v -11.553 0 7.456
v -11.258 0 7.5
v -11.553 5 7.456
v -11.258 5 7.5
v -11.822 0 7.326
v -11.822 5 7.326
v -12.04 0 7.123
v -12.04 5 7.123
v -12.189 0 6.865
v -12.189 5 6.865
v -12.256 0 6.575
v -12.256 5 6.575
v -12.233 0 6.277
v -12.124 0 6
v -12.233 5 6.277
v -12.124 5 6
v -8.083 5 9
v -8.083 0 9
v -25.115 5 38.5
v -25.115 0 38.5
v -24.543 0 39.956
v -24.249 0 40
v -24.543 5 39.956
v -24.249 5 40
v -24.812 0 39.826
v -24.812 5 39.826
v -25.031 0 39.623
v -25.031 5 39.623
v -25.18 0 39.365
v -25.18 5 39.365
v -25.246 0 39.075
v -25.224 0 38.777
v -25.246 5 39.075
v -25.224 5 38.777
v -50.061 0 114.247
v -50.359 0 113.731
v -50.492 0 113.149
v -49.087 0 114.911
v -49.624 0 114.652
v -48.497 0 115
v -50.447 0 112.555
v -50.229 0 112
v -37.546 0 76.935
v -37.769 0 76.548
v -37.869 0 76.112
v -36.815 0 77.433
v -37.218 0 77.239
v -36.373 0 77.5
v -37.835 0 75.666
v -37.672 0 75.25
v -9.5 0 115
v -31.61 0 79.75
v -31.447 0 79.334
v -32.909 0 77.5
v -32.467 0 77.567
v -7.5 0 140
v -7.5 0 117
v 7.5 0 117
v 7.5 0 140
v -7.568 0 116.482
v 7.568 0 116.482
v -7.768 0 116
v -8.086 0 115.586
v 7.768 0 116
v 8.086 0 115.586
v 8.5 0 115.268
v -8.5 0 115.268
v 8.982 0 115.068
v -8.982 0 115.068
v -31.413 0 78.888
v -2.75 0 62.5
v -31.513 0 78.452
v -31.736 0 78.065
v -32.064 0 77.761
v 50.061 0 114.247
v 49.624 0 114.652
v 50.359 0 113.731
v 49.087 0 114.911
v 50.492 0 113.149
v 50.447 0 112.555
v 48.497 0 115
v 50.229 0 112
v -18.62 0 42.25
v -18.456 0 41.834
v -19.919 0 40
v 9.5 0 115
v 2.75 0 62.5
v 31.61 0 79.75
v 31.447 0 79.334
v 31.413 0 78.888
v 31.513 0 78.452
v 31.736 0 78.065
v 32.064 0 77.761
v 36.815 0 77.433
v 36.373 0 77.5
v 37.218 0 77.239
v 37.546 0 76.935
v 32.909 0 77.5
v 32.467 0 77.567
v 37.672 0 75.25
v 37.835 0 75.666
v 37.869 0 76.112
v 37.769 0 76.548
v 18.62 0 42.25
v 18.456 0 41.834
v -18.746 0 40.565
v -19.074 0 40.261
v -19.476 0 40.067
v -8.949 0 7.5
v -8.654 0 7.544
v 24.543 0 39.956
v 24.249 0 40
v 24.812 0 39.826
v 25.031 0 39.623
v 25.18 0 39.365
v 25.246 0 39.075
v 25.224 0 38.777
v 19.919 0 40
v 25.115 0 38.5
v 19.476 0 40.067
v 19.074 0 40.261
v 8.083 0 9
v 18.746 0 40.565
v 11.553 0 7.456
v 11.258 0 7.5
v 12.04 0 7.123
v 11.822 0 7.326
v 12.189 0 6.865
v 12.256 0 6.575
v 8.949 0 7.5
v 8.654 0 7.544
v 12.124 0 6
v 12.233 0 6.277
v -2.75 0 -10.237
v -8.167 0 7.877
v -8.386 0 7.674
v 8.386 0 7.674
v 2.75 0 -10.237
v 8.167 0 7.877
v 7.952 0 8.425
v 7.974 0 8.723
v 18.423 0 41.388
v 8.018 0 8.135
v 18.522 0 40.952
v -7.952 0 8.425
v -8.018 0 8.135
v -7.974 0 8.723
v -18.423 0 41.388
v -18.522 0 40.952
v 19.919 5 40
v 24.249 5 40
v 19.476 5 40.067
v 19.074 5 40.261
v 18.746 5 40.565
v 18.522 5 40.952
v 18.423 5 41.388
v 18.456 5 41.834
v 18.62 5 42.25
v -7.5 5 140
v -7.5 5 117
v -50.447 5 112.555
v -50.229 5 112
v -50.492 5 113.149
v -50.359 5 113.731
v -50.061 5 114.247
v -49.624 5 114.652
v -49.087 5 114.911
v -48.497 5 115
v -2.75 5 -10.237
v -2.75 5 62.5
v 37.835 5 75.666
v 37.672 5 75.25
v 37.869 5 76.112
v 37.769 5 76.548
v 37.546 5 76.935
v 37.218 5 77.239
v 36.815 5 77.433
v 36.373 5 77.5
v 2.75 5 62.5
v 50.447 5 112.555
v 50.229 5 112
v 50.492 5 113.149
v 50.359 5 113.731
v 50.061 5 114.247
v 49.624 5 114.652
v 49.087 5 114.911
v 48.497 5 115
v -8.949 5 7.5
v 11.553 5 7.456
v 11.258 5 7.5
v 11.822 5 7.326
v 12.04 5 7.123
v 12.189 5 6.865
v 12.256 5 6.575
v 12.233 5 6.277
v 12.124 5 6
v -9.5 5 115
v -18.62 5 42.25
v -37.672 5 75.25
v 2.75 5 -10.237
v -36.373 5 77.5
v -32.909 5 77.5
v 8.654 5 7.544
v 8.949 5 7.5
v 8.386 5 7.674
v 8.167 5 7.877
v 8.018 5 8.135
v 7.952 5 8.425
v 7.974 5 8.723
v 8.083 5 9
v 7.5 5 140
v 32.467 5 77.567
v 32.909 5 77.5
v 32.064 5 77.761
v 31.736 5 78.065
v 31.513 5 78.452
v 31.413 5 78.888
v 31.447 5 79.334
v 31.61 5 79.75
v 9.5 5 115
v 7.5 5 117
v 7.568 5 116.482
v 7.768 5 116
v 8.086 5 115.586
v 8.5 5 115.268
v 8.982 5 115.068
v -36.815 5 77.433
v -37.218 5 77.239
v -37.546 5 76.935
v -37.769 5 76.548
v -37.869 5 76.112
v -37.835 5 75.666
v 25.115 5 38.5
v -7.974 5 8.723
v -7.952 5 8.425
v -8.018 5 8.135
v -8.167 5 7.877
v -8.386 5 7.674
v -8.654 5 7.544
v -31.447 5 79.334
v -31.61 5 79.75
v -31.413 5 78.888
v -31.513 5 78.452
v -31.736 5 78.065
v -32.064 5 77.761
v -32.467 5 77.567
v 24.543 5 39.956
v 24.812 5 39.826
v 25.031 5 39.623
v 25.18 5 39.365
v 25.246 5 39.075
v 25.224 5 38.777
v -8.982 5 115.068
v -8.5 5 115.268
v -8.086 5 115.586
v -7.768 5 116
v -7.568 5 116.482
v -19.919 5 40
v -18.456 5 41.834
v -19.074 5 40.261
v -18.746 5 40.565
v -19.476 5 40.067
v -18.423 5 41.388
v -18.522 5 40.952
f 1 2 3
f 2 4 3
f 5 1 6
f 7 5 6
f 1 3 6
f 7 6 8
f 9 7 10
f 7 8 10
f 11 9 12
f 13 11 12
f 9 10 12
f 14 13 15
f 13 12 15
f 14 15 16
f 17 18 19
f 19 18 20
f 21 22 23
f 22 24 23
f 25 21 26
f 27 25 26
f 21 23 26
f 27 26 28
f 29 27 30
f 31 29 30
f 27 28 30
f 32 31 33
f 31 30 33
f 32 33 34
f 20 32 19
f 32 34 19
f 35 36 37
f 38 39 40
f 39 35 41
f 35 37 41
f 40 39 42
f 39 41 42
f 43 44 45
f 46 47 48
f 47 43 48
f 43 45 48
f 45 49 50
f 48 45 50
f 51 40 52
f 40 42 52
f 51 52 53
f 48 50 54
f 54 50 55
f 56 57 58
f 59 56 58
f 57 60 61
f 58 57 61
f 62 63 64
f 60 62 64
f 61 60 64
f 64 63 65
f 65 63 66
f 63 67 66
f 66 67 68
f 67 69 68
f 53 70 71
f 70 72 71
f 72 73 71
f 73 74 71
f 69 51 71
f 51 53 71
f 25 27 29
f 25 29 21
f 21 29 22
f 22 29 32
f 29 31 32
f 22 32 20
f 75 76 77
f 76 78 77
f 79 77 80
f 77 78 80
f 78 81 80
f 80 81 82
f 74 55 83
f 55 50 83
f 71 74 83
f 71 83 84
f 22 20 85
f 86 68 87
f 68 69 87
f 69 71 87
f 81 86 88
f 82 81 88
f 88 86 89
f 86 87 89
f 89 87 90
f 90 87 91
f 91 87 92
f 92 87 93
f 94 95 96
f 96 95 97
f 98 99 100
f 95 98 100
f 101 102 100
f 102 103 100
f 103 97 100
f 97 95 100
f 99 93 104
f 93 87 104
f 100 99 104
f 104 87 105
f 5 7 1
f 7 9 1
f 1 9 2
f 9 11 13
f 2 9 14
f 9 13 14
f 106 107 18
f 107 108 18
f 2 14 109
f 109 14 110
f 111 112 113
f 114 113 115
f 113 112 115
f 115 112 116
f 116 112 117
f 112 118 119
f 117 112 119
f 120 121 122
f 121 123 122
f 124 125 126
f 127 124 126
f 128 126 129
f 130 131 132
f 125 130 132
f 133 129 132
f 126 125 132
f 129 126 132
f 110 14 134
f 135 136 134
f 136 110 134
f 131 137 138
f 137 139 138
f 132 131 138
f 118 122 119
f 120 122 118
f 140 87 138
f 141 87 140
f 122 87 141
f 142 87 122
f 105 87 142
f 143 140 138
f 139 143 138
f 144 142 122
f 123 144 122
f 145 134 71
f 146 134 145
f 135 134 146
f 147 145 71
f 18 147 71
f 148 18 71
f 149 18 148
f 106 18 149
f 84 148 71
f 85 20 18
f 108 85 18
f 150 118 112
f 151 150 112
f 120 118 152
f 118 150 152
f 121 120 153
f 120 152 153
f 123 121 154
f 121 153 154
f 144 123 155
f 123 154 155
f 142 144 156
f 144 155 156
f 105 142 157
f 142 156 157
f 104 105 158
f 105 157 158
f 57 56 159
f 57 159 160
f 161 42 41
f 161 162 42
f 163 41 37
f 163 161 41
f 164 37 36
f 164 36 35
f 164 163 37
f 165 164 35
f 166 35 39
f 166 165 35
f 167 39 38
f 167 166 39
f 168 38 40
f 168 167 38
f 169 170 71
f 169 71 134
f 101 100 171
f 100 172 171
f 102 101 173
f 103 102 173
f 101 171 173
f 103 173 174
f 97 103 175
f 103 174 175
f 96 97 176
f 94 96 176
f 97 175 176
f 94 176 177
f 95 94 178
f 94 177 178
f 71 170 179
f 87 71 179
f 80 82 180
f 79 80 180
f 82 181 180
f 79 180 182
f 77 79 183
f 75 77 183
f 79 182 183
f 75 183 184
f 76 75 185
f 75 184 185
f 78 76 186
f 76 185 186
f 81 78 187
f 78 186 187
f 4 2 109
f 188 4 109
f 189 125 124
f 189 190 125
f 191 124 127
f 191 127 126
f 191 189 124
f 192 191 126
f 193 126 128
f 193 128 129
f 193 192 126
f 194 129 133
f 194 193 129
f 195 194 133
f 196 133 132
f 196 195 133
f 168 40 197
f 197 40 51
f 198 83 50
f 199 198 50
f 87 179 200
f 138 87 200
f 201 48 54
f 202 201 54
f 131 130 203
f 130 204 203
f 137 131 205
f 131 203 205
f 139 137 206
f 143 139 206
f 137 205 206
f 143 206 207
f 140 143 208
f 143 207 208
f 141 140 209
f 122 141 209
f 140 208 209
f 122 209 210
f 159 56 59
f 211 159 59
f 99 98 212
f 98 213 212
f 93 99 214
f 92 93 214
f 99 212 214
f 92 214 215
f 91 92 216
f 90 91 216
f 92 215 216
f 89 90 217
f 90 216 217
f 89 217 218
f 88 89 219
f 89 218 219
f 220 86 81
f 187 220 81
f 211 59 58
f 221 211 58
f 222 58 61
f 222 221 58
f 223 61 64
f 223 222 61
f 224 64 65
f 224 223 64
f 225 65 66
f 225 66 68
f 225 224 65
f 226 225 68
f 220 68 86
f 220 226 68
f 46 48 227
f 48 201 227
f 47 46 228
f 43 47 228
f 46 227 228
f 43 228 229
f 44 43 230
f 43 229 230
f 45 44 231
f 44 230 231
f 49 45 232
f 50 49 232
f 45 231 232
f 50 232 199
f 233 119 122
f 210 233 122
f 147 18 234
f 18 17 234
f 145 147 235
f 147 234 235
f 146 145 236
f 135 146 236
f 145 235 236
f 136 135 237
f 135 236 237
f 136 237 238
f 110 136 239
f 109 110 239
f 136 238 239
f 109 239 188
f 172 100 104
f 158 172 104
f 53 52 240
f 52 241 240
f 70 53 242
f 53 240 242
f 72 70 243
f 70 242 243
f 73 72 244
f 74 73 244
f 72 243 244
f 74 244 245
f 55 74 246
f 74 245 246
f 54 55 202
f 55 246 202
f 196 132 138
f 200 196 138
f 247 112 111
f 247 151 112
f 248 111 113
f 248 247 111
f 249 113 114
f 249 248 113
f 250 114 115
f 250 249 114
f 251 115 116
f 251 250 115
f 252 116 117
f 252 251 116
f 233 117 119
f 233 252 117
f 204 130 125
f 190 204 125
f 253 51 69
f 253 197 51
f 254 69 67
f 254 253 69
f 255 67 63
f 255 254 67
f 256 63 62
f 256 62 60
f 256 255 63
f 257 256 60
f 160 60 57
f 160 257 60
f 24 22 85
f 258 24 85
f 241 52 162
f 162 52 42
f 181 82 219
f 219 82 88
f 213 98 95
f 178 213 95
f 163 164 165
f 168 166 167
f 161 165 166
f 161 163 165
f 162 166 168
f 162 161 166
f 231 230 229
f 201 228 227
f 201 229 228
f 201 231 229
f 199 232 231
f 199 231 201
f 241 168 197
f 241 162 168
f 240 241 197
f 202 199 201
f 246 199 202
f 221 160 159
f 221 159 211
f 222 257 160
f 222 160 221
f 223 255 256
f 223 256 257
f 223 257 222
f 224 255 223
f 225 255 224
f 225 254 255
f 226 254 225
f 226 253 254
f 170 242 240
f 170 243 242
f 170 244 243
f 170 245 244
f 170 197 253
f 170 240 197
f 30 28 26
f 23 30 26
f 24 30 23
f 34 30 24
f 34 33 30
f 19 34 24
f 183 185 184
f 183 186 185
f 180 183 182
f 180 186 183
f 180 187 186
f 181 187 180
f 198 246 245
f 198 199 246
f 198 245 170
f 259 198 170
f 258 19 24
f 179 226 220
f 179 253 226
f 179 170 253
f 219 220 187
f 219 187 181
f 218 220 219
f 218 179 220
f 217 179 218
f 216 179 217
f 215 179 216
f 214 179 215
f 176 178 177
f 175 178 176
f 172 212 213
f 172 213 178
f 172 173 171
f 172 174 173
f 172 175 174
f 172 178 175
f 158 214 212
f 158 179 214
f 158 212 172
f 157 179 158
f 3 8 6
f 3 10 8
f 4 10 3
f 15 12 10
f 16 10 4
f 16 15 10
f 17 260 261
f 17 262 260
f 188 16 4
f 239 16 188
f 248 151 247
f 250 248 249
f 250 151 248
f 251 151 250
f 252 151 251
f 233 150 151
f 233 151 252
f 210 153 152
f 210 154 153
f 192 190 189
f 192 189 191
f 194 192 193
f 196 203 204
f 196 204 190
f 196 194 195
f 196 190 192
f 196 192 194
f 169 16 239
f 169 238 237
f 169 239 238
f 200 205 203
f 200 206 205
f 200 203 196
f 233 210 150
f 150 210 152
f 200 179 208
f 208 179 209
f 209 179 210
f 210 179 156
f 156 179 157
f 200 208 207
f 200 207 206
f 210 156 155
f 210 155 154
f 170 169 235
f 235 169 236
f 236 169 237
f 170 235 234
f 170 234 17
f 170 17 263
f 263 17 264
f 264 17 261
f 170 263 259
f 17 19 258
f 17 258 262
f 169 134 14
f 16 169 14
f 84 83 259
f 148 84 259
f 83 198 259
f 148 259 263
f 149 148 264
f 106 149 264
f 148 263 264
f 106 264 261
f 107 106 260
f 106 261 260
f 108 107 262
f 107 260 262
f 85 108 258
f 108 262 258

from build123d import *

# Parameters (mm, degrees)
ESBO_O1_W     = 15
ESBO_O1_H     = 25
RVORE_DEPTH   = 5
ESBO_O3_W     = 5.5
ESBO_O3_H     = 77.5
ENCAIXE_DEPTH = 5
FILETE1_R     = 1.5
FILETE2_R     = 1
FILETE3_R     = 1.5
FILETE4_R     = 1.5
FILETE5_R     = 2
FILETE6_R     = 1
FILETE7_R     = 1
FILETE8_R     = 2
FILETE9_R     = 1.5
FILETE10_R    = 1.5
FILETE11_R    = 1.5
FILETE12_R    = 1
FILETE13_R    = 1
FILETE14_R    = 1
FILETE15_R    = 2
FILETE16_R    = 2


with BuildPart() as part:
    # Esboço1 → rvore (new body)
    with BuildSketch(Plane(origin=(0, 0, 0), x_dir=(1, 0, 0), z_dir=(0, 1, 0))):
        with Locations((0, -127.5)):
            Rectangle(ESBO_O1_W, ESBO_O1_H)
        Polygon((-51.961524227, -115), (-7.5, -115), (7.5, -115), (51.961524227, -115), (30.310889132, -77.5), (-30.310889132, -77.5), align=None)
        Polygon((-8.660254038, -40), (-30.310889132, -77.5), (30.310889132, -77.5), (8.660254038, -40), align=None)
        Polygon((-17.320508076, -40), (-8.660254038, -40), (0, -25), (8.660254038, -40), (17.320508076, -40), (0, -10), align=None)
        Polygon((8.660254038, -40), (30.310889132, -77.5), (38.97114317, -77.5), (17.320508076, -40), align=None)
        Polygon((0, -25), (-8.660254038, -40), (8.660254038, -40), align=None)
        Polygon((-38.97114317, -77.5), (-30.310889132, -77.5), (-8.660254038, -40), (-17.320508076, -40), align=None)
        Polygon((-25.980762114, -40), (-17.320508076, -40), (0, -10), (17.320508076, -40), (25.980762114, -40), (7.216878365, -7.5), (-7.216878365, -7.5), align=None)
        Polygon((0, 5), (-7.216878365, -7.5), (7.216878365, -7.5), align=None)
        Polygon((-12.990381057, -7.5), (-7.216878365, -7.5), (0, 5), (7.216878365, -7.5), (12.990381057, -7.5), (0, 15), align=None)
    extrude(amount=RVORE_DEPTH)

    # Esboço3 → Encaixe (cut)
    with BuildSketch(Plane(origin=(0, 5, 0), x_dir=(1, 0, 0), z_dir=(0, 1, 0))):
        with Locations((0, -23.75)):
            Rectangle(ESBO_O3_W, ESBO_O3_H)
    extrude(amount=-ENCAIXE_DEPTH, mode=Mode.SUBTRACT)

    # Filete1
    filete1_edges = [part.edges().sort_by_distance(p)[0] for p in [
        (17.320508076, 2.5, 40),
    ]]
    fillet(filete1_edges, radius=FILETE1_R)

    # Filete2
    filete2_edges = [part.edges().sort_by_distance(p)[0] for p in [
        (25.980762114, 2.5, 40),
    ]]
    fillet(filete2_edges, radius=FILETE2_R)

    # Filete3
    filete3_edges = [part.edges().sort_by_distance(p)[0] for p in [
        (38.97114317, 2.5, 77.5),
    ]]
    fillet(filete3_edges, radius=FILETE3_R)

    # Filete4
    filete4_edges = [part.edges().sort_by_distance(p)[0] for p in [
        (30.310889132, 2.5, 77.5),
    ]]
    fillet(filete4_edges, radius=FILETE4_R)

    # Filete5
    filete5_edges = [part.edges().sort_by_distance(p)[0] for p in [
        (51.961524227, 2.5, 115),
    ]]
    fillet(filete5_edges, radius=FILETE5_R)

    # Filete6
    filete6_edges = [part.edges().sort_by_distance(p)[0] for p in [
        (12.990381057, 2.5, 7.5),
    ]]
    fillet(filete6_edges, radius=FILETE6_R)

    # Filete7
    filete7_edges = [part.edges().sort_by_distance(p)[0] for p in [
        (7.216878365, 2.5, 7.5),
    ]]
    fillet(filete7_edges, radius=FILETE7_R)

    # Filete8
    filete8_edges = [part.edges().sort_by_distance(p)[0] for p in [
        (-51.961524227, 2.5, 115),
    ]]
    fillet(filete8_edges, radius=FILETE8_R)

    # Filete9
    filete9_edges = [part.edges().sort_by_distance(p)[0] for p in [
        (-30.310889132, 2.5, 77.5),
    ]]
    fillet(filete9_edges, radius=FILETE9_R)

    # Filete10
    filete10_edges = [part.edges().sort_by_distance(p)[0] for p in [
        (-38.97114317, 2.5, 77.5),
    ]]
    fillet(filete10_edges, radius=FILETE10_R)

    # Filete11
    filete11_edges = [part.edges().sort_by_distance(p)[0] for p in [
        (-17.320508076, 2.5, 40),
    ]]
    fillet(filete11_edges, radius=FILETE11_R)

    # Filete12
    filete12_edges = [part.edges().sort_by_distance(p)[0] for p in [
        (-25.980762114, 2.5, 40),
    ]]
    fillet(filete12_edges, radius=FILETE12_R)

    # Filete13
    filete13_edges = [part.edges().sort_by_distance(p)[0] for p in [
        (-7.216878365, 2.5, 7.5),
    ]]
    fillet(filete13_edges, radius=FILETE13_R)

    # Filete14
    filete14_edges = [part.edges().sort_by_distance(p)[0] for p in [
        (-12.990381057, 2.5, 7.5),
    ]]
    fillet(filete14_edges, radius=FILETE14_R)

    # Filete15
    filete15_edges = [part.edges().sort_by_distance(p)[0] for p in [
        (-7.5, 2.5, 115),
    ]]
    fillet(filete15_edges, radius=FILETE15_R)

    # Filete16
    filete16_edges = [part.edges().sort_by_distance(p)[0] for p in [
        (7.5, 2.5, 115),
    ]]
    fillet(filete16_edges, radius=FILETE16_R)


solid = part.part
